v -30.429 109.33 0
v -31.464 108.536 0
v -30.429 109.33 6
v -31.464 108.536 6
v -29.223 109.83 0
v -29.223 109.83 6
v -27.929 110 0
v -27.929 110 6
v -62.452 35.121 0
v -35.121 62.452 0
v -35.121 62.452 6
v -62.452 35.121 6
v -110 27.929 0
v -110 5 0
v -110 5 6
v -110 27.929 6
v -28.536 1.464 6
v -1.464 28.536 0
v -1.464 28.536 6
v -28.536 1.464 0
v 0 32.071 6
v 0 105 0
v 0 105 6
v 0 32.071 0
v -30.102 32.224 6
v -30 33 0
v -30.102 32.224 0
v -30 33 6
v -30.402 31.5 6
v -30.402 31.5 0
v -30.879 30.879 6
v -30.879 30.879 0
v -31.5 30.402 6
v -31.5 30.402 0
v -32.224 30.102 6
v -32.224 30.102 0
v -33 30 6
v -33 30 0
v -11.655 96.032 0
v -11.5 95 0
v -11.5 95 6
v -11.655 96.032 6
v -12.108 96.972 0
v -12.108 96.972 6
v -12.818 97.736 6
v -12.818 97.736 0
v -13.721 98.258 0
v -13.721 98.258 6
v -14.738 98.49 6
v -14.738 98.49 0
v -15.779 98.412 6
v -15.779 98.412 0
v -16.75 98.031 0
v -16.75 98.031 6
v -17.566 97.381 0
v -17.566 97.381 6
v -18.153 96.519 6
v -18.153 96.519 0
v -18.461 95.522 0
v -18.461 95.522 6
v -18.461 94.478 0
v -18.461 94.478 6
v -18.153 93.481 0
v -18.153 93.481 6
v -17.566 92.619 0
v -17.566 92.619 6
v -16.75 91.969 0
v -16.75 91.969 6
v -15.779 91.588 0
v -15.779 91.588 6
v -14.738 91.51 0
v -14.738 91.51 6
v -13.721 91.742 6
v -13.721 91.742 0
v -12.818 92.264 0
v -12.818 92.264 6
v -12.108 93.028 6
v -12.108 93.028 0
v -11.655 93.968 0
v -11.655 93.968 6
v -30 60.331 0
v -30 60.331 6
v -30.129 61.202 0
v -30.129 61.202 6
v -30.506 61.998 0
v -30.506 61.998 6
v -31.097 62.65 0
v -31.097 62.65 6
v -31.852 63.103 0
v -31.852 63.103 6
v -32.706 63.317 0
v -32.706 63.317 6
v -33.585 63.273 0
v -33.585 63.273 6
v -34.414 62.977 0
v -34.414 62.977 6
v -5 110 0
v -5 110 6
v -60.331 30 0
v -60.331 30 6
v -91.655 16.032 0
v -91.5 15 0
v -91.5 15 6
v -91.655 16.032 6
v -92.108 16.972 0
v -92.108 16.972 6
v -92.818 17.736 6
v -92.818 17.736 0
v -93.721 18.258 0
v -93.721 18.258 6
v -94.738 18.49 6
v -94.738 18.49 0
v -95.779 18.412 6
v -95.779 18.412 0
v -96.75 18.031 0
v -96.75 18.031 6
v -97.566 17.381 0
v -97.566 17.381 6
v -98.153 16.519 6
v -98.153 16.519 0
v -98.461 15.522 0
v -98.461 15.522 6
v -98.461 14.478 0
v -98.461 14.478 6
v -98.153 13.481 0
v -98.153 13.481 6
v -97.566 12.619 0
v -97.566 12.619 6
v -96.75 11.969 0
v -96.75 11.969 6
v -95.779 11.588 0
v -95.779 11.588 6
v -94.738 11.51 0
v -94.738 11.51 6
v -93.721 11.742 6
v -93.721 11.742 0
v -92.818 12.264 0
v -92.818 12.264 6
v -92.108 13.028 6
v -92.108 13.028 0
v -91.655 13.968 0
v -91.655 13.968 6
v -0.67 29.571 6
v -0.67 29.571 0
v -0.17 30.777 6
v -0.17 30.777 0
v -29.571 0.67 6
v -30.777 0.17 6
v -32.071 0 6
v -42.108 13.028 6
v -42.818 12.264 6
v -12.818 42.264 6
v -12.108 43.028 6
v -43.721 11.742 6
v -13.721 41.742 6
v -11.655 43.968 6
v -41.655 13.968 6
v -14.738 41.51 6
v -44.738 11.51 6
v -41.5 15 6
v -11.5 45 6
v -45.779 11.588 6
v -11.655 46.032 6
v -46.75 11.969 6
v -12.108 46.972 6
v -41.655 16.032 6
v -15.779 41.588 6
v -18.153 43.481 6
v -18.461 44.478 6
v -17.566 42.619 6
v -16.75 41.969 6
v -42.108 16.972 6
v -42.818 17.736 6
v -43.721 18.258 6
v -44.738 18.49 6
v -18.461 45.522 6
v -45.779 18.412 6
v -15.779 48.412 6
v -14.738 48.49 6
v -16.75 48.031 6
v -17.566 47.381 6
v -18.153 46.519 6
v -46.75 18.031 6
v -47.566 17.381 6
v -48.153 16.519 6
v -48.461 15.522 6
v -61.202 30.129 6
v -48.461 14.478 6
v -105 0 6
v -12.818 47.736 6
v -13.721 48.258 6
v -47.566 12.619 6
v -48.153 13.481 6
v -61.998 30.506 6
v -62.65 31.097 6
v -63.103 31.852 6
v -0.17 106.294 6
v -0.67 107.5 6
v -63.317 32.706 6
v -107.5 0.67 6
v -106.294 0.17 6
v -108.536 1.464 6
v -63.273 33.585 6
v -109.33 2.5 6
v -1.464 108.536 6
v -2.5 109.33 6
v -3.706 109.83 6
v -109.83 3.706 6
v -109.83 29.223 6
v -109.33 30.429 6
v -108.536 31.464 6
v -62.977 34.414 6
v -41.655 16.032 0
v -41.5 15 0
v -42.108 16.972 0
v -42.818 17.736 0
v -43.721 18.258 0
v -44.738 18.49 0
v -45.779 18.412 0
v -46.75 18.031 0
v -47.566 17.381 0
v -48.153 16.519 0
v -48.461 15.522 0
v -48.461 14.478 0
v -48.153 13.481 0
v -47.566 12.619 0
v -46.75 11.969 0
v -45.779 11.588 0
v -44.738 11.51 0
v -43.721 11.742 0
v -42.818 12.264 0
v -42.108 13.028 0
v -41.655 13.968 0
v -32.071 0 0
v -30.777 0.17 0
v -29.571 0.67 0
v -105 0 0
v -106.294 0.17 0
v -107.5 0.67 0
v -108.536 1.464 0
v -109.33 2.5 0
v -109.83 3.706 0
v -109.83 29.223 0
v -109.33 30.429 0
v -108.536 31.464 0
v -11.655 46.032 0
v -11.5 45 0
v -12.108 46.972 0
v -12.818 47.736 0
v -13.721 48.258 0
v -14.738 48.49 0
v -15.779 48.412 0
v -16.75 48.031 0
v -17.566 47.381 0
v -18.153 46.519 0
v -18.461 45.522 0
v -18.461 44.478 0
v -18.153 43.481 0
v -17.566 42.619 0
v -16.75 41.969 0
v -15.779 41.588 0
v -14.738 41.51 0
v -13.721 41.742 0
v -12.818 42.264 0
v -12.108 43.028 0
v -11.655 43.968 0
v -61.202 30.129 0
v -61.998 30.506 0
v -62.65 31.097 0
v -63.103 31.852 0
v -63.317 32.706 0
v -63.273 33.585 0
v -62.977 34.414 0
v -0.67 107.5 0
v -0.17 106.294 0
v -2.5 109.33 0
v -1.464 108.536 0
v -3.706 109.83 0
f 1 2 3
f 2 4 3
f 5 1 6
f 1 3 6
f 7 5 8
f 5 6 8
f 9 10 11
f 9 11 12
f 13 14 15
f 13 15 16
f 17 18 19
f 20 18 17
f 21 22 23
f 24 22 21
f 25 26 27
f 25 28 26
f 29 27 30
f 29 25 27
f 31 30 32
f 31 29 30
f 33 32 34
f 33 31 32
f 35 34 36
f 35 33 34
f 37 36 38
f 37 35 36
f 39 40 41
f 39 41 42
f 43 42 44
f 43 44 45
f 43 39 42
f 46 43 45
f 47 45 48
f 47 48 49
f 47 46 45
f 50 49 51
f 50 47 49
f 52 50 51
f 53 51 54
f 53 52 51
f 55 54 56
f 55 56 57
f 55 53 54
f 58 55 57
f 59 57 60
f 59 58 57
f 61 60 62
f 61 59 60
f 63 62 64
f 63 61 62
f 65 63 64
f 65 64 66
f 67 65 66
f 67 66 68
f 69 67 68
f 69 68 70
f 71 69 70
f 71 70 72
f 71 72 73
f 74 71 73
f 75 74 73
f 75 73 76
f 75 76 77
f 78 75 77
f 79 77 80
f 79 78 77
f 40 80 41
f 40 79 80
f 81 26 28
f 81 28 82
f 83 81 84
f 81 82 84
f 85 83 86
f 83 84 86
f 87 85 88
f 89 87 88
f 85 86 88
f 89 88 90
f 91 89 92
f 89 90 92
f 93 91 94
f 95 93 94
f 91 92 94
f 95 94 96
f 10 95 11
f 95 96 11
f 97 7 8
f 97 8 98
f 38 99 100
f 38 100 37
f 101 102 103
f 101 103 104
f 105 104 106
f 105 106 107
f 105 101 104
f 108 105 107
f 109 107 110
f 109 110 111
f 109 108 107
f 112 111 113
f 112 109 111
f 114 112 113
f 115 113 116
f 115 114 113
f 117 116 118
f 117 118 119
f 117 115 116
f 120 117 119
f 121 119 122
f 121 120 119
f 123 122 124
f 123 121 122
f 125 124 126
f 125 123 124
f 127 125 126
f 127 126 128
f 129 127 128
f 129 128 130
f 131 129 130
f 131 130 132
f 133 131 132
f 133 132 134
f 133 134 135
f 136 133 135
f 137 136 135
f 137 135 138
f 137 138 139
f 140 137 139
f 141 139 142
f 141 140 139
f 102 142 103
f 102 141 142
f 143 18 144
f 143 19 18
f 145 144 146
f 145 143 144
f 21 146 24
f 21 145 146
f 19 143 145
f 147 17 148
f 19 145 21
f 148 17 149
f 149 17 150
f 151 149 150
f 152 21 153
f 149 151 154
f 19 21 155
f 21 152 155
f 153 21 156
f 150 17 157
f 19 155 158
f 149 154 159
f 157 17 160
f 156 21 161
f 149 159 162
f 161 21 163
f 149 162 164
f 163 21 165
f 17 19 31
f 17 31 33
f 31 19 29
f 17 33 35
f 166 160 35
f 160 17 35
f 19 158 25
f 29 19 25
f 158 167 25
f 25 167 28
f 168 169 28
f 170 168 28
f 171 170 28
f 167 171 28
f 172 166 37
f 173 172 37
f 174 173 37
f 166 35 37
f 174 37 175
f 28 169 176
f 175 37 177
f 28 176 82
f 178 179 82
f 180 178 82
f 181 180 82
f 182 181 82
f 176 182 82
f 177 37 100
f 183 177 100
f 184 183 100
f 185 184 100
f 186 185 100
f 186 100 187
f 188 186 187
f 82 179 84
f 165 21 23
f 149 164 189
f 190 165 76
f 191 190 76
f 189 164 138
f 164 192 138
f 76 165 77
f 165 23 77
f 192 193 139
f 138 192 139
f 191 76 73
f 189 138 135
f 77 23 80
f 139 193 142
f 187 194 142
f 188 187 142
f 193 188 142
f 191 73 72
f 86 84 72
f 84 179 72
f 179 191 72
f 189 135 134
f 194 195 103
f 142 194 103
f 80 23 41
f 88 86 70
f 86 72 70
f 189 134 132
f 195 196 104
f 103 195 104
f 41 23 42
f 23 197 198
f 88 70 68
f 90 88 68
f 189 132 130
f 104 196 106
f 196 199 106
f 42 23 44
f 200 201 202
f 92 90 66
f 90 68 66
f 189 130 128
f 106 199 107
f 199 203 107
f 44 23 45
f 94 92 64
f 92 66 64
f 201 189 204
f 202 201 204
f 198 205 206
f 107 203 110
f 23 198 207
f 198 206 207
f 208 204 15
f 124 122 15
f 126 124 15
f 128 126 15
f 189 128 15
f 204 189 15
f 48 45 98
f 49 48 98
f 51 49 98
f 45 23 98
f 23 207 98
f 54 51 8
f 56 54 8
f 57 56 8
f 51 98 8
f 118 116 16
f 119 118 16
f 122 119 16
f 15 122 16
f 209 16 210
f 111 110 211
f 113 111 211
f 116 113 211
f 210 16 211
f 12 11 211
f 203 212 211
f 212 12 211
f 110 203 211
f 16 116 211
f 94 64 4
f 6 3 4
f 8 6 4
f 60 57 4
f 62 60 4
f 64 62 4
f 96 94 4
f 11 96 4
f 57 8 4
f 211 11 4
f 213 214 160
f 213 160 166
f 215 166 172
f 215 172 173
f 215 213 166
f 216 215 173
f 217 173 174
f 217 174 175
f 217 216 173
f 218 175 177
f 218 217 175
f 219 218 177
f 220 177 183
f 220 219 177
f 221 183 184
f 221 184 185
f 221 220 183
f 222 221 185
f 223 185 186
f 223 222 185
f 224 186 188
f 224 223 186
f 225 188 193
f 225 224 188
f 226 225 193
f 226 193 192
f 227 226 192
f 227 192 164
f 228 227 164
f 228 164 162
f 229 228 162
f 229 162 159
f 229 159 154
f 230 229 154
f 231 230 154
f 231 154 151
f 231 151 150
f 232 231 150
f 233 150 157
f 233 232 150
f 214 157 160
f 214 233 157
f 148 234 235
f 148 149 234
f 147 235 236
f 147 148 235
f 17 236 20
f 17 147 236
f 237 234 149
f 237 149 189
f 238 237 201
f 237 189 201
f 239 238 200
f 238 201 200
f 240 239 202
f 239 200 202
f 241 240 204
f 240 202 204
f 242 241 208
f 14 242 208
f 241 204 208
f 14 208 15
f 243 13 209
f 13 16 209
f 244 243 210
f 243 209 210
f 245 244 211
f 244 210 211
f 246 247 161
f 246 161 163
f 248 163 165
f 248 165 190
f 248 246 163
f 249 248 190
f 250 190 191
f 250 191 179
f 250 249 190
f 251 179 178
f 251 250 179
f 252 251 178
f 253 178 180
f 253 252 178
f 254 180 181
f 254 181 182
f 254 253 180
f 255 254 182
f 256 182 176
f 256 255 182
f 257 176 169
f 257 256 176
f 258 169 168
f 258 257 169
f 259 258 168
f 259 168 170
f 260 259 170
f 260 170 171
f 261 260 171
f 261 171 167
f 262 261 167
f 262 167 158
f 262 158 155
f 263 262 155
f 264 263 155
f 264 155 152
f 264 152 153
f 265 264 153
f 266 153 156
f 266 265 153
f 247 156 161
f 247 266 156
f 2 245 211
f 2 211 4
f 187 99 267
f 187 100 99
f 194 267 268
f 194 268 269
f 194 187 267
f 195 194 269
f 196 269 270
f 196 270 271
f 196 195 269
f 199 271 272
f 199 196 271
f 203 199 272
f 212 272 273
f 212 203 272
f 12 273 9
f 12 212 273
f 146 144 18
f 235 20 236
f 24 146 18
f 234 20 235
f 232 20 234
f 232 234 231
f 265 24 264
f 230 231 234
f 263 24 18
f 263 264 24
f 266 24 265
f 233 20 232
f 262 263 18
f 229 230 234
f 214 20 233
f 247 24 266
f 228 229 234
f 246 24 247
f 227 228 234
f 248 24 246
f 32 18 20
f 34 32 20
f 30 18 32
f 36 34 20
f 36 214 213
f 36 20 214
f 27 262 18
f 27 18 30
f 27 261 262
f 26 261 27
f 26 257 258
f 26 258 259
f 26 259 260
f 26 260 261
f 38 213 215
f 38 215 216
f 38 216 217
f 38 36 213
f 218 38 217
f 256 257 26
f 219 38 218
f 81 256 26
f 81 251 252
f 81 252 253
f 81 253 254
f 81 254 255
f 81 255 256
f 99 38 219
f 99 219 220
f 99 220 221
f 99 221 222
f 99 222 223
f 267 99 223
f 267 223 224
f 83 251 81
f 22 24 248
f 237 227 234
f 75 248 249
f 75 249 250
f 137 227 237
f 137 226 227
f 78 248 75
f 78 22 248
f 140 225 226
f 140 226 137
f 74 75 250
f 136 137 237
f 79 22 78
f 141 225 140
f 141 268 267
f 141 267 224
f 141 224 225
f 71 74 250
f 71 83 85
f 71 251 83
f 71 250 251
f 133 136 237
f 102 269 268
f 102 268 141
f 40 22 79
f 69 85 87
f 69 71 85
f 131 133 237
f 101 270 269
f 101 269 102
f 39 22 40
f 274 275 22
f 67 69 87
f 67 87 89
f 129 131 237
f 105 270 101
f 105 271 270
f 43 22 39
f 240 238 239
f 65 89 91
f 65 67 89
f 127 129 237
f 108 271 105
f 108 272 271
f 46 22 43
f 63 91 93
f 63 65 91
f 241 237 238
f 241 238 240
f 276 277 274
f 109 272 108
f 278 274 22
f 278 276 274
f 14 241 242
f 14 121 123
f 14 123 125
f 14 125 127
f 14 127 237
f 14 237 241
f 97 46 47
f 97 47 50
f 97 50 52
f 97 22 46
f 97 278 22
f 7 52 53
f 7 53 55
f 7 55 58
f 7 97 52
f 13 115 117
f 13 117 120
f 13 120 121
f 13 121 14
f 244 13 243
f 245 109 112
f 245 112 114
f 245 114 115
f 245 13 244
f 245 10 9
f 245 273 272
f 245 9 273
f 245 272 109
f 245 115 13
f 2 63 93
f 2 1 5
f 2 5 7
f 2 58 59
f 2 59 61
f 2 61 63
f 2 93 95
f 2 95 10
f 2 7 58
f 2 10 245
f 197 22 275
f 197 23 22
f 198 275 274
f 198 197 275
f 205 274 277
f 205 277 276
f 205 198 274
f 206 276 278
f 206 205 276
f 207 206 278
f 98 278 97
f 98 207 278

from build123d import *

# Parameters (mm, degrees)
SKETCH_R    = 3.5
PAD_DEPTH   = 6
FILLET_R    = 5
FILLET001_R = 3


with BuildPart() as part:
    # Sketch → Pad (new body)
    with BuildSketch(Plane.XY):
        Polygon((-30, 0), (-110, 0), (-110, 30), (-30, 110), (0, 110), (0, 30), align=None)
        with Locations((-95, 15)):
            Circle(SKETCH_R, mode=Mode.SUBTRACT)
        with Locations((-45, 15)):
            Circle(SKETCH_R, mode=Mode.SUBTRACT)
        with Locations((-15, 45)):
            Circle(SKETCH_R, mode=Mode.SUBTRACT)
        with Locations((-15, 95)):
            Circle(SKETCH_R, mode=Mode.SUBTRACT)
        Polygon((-30, 67.573593), (-67.573593, 30), (-30, 30), align=None, mode=Mode.SUBTRACT)
    extrude(amount=PAD_DEPTH)

    # Fillet
    fillet_edges = [part.edges().sort_by_distance(p)[0] for p in [
        (-110, 0, 3),
        (-110, 30, 3),
        (-30, 110, 3),
        (0, 110, 3),
        (0, 30, 3),
        (-30, 0, 3),
    ]]
    fillet(fillet_edges, radius=FILLET_R)

    # Fillet001
    fillet001_edges = [part.edges().sort_by_distance(p)[0] for p in [
        (-67.573593, 30, 3),
        (-30, 67.573593, 3),
        (-30, 30, 3),
    ]]
    fillet(fillet001_edges, radius=FILLET001_R)


solid = part.part
